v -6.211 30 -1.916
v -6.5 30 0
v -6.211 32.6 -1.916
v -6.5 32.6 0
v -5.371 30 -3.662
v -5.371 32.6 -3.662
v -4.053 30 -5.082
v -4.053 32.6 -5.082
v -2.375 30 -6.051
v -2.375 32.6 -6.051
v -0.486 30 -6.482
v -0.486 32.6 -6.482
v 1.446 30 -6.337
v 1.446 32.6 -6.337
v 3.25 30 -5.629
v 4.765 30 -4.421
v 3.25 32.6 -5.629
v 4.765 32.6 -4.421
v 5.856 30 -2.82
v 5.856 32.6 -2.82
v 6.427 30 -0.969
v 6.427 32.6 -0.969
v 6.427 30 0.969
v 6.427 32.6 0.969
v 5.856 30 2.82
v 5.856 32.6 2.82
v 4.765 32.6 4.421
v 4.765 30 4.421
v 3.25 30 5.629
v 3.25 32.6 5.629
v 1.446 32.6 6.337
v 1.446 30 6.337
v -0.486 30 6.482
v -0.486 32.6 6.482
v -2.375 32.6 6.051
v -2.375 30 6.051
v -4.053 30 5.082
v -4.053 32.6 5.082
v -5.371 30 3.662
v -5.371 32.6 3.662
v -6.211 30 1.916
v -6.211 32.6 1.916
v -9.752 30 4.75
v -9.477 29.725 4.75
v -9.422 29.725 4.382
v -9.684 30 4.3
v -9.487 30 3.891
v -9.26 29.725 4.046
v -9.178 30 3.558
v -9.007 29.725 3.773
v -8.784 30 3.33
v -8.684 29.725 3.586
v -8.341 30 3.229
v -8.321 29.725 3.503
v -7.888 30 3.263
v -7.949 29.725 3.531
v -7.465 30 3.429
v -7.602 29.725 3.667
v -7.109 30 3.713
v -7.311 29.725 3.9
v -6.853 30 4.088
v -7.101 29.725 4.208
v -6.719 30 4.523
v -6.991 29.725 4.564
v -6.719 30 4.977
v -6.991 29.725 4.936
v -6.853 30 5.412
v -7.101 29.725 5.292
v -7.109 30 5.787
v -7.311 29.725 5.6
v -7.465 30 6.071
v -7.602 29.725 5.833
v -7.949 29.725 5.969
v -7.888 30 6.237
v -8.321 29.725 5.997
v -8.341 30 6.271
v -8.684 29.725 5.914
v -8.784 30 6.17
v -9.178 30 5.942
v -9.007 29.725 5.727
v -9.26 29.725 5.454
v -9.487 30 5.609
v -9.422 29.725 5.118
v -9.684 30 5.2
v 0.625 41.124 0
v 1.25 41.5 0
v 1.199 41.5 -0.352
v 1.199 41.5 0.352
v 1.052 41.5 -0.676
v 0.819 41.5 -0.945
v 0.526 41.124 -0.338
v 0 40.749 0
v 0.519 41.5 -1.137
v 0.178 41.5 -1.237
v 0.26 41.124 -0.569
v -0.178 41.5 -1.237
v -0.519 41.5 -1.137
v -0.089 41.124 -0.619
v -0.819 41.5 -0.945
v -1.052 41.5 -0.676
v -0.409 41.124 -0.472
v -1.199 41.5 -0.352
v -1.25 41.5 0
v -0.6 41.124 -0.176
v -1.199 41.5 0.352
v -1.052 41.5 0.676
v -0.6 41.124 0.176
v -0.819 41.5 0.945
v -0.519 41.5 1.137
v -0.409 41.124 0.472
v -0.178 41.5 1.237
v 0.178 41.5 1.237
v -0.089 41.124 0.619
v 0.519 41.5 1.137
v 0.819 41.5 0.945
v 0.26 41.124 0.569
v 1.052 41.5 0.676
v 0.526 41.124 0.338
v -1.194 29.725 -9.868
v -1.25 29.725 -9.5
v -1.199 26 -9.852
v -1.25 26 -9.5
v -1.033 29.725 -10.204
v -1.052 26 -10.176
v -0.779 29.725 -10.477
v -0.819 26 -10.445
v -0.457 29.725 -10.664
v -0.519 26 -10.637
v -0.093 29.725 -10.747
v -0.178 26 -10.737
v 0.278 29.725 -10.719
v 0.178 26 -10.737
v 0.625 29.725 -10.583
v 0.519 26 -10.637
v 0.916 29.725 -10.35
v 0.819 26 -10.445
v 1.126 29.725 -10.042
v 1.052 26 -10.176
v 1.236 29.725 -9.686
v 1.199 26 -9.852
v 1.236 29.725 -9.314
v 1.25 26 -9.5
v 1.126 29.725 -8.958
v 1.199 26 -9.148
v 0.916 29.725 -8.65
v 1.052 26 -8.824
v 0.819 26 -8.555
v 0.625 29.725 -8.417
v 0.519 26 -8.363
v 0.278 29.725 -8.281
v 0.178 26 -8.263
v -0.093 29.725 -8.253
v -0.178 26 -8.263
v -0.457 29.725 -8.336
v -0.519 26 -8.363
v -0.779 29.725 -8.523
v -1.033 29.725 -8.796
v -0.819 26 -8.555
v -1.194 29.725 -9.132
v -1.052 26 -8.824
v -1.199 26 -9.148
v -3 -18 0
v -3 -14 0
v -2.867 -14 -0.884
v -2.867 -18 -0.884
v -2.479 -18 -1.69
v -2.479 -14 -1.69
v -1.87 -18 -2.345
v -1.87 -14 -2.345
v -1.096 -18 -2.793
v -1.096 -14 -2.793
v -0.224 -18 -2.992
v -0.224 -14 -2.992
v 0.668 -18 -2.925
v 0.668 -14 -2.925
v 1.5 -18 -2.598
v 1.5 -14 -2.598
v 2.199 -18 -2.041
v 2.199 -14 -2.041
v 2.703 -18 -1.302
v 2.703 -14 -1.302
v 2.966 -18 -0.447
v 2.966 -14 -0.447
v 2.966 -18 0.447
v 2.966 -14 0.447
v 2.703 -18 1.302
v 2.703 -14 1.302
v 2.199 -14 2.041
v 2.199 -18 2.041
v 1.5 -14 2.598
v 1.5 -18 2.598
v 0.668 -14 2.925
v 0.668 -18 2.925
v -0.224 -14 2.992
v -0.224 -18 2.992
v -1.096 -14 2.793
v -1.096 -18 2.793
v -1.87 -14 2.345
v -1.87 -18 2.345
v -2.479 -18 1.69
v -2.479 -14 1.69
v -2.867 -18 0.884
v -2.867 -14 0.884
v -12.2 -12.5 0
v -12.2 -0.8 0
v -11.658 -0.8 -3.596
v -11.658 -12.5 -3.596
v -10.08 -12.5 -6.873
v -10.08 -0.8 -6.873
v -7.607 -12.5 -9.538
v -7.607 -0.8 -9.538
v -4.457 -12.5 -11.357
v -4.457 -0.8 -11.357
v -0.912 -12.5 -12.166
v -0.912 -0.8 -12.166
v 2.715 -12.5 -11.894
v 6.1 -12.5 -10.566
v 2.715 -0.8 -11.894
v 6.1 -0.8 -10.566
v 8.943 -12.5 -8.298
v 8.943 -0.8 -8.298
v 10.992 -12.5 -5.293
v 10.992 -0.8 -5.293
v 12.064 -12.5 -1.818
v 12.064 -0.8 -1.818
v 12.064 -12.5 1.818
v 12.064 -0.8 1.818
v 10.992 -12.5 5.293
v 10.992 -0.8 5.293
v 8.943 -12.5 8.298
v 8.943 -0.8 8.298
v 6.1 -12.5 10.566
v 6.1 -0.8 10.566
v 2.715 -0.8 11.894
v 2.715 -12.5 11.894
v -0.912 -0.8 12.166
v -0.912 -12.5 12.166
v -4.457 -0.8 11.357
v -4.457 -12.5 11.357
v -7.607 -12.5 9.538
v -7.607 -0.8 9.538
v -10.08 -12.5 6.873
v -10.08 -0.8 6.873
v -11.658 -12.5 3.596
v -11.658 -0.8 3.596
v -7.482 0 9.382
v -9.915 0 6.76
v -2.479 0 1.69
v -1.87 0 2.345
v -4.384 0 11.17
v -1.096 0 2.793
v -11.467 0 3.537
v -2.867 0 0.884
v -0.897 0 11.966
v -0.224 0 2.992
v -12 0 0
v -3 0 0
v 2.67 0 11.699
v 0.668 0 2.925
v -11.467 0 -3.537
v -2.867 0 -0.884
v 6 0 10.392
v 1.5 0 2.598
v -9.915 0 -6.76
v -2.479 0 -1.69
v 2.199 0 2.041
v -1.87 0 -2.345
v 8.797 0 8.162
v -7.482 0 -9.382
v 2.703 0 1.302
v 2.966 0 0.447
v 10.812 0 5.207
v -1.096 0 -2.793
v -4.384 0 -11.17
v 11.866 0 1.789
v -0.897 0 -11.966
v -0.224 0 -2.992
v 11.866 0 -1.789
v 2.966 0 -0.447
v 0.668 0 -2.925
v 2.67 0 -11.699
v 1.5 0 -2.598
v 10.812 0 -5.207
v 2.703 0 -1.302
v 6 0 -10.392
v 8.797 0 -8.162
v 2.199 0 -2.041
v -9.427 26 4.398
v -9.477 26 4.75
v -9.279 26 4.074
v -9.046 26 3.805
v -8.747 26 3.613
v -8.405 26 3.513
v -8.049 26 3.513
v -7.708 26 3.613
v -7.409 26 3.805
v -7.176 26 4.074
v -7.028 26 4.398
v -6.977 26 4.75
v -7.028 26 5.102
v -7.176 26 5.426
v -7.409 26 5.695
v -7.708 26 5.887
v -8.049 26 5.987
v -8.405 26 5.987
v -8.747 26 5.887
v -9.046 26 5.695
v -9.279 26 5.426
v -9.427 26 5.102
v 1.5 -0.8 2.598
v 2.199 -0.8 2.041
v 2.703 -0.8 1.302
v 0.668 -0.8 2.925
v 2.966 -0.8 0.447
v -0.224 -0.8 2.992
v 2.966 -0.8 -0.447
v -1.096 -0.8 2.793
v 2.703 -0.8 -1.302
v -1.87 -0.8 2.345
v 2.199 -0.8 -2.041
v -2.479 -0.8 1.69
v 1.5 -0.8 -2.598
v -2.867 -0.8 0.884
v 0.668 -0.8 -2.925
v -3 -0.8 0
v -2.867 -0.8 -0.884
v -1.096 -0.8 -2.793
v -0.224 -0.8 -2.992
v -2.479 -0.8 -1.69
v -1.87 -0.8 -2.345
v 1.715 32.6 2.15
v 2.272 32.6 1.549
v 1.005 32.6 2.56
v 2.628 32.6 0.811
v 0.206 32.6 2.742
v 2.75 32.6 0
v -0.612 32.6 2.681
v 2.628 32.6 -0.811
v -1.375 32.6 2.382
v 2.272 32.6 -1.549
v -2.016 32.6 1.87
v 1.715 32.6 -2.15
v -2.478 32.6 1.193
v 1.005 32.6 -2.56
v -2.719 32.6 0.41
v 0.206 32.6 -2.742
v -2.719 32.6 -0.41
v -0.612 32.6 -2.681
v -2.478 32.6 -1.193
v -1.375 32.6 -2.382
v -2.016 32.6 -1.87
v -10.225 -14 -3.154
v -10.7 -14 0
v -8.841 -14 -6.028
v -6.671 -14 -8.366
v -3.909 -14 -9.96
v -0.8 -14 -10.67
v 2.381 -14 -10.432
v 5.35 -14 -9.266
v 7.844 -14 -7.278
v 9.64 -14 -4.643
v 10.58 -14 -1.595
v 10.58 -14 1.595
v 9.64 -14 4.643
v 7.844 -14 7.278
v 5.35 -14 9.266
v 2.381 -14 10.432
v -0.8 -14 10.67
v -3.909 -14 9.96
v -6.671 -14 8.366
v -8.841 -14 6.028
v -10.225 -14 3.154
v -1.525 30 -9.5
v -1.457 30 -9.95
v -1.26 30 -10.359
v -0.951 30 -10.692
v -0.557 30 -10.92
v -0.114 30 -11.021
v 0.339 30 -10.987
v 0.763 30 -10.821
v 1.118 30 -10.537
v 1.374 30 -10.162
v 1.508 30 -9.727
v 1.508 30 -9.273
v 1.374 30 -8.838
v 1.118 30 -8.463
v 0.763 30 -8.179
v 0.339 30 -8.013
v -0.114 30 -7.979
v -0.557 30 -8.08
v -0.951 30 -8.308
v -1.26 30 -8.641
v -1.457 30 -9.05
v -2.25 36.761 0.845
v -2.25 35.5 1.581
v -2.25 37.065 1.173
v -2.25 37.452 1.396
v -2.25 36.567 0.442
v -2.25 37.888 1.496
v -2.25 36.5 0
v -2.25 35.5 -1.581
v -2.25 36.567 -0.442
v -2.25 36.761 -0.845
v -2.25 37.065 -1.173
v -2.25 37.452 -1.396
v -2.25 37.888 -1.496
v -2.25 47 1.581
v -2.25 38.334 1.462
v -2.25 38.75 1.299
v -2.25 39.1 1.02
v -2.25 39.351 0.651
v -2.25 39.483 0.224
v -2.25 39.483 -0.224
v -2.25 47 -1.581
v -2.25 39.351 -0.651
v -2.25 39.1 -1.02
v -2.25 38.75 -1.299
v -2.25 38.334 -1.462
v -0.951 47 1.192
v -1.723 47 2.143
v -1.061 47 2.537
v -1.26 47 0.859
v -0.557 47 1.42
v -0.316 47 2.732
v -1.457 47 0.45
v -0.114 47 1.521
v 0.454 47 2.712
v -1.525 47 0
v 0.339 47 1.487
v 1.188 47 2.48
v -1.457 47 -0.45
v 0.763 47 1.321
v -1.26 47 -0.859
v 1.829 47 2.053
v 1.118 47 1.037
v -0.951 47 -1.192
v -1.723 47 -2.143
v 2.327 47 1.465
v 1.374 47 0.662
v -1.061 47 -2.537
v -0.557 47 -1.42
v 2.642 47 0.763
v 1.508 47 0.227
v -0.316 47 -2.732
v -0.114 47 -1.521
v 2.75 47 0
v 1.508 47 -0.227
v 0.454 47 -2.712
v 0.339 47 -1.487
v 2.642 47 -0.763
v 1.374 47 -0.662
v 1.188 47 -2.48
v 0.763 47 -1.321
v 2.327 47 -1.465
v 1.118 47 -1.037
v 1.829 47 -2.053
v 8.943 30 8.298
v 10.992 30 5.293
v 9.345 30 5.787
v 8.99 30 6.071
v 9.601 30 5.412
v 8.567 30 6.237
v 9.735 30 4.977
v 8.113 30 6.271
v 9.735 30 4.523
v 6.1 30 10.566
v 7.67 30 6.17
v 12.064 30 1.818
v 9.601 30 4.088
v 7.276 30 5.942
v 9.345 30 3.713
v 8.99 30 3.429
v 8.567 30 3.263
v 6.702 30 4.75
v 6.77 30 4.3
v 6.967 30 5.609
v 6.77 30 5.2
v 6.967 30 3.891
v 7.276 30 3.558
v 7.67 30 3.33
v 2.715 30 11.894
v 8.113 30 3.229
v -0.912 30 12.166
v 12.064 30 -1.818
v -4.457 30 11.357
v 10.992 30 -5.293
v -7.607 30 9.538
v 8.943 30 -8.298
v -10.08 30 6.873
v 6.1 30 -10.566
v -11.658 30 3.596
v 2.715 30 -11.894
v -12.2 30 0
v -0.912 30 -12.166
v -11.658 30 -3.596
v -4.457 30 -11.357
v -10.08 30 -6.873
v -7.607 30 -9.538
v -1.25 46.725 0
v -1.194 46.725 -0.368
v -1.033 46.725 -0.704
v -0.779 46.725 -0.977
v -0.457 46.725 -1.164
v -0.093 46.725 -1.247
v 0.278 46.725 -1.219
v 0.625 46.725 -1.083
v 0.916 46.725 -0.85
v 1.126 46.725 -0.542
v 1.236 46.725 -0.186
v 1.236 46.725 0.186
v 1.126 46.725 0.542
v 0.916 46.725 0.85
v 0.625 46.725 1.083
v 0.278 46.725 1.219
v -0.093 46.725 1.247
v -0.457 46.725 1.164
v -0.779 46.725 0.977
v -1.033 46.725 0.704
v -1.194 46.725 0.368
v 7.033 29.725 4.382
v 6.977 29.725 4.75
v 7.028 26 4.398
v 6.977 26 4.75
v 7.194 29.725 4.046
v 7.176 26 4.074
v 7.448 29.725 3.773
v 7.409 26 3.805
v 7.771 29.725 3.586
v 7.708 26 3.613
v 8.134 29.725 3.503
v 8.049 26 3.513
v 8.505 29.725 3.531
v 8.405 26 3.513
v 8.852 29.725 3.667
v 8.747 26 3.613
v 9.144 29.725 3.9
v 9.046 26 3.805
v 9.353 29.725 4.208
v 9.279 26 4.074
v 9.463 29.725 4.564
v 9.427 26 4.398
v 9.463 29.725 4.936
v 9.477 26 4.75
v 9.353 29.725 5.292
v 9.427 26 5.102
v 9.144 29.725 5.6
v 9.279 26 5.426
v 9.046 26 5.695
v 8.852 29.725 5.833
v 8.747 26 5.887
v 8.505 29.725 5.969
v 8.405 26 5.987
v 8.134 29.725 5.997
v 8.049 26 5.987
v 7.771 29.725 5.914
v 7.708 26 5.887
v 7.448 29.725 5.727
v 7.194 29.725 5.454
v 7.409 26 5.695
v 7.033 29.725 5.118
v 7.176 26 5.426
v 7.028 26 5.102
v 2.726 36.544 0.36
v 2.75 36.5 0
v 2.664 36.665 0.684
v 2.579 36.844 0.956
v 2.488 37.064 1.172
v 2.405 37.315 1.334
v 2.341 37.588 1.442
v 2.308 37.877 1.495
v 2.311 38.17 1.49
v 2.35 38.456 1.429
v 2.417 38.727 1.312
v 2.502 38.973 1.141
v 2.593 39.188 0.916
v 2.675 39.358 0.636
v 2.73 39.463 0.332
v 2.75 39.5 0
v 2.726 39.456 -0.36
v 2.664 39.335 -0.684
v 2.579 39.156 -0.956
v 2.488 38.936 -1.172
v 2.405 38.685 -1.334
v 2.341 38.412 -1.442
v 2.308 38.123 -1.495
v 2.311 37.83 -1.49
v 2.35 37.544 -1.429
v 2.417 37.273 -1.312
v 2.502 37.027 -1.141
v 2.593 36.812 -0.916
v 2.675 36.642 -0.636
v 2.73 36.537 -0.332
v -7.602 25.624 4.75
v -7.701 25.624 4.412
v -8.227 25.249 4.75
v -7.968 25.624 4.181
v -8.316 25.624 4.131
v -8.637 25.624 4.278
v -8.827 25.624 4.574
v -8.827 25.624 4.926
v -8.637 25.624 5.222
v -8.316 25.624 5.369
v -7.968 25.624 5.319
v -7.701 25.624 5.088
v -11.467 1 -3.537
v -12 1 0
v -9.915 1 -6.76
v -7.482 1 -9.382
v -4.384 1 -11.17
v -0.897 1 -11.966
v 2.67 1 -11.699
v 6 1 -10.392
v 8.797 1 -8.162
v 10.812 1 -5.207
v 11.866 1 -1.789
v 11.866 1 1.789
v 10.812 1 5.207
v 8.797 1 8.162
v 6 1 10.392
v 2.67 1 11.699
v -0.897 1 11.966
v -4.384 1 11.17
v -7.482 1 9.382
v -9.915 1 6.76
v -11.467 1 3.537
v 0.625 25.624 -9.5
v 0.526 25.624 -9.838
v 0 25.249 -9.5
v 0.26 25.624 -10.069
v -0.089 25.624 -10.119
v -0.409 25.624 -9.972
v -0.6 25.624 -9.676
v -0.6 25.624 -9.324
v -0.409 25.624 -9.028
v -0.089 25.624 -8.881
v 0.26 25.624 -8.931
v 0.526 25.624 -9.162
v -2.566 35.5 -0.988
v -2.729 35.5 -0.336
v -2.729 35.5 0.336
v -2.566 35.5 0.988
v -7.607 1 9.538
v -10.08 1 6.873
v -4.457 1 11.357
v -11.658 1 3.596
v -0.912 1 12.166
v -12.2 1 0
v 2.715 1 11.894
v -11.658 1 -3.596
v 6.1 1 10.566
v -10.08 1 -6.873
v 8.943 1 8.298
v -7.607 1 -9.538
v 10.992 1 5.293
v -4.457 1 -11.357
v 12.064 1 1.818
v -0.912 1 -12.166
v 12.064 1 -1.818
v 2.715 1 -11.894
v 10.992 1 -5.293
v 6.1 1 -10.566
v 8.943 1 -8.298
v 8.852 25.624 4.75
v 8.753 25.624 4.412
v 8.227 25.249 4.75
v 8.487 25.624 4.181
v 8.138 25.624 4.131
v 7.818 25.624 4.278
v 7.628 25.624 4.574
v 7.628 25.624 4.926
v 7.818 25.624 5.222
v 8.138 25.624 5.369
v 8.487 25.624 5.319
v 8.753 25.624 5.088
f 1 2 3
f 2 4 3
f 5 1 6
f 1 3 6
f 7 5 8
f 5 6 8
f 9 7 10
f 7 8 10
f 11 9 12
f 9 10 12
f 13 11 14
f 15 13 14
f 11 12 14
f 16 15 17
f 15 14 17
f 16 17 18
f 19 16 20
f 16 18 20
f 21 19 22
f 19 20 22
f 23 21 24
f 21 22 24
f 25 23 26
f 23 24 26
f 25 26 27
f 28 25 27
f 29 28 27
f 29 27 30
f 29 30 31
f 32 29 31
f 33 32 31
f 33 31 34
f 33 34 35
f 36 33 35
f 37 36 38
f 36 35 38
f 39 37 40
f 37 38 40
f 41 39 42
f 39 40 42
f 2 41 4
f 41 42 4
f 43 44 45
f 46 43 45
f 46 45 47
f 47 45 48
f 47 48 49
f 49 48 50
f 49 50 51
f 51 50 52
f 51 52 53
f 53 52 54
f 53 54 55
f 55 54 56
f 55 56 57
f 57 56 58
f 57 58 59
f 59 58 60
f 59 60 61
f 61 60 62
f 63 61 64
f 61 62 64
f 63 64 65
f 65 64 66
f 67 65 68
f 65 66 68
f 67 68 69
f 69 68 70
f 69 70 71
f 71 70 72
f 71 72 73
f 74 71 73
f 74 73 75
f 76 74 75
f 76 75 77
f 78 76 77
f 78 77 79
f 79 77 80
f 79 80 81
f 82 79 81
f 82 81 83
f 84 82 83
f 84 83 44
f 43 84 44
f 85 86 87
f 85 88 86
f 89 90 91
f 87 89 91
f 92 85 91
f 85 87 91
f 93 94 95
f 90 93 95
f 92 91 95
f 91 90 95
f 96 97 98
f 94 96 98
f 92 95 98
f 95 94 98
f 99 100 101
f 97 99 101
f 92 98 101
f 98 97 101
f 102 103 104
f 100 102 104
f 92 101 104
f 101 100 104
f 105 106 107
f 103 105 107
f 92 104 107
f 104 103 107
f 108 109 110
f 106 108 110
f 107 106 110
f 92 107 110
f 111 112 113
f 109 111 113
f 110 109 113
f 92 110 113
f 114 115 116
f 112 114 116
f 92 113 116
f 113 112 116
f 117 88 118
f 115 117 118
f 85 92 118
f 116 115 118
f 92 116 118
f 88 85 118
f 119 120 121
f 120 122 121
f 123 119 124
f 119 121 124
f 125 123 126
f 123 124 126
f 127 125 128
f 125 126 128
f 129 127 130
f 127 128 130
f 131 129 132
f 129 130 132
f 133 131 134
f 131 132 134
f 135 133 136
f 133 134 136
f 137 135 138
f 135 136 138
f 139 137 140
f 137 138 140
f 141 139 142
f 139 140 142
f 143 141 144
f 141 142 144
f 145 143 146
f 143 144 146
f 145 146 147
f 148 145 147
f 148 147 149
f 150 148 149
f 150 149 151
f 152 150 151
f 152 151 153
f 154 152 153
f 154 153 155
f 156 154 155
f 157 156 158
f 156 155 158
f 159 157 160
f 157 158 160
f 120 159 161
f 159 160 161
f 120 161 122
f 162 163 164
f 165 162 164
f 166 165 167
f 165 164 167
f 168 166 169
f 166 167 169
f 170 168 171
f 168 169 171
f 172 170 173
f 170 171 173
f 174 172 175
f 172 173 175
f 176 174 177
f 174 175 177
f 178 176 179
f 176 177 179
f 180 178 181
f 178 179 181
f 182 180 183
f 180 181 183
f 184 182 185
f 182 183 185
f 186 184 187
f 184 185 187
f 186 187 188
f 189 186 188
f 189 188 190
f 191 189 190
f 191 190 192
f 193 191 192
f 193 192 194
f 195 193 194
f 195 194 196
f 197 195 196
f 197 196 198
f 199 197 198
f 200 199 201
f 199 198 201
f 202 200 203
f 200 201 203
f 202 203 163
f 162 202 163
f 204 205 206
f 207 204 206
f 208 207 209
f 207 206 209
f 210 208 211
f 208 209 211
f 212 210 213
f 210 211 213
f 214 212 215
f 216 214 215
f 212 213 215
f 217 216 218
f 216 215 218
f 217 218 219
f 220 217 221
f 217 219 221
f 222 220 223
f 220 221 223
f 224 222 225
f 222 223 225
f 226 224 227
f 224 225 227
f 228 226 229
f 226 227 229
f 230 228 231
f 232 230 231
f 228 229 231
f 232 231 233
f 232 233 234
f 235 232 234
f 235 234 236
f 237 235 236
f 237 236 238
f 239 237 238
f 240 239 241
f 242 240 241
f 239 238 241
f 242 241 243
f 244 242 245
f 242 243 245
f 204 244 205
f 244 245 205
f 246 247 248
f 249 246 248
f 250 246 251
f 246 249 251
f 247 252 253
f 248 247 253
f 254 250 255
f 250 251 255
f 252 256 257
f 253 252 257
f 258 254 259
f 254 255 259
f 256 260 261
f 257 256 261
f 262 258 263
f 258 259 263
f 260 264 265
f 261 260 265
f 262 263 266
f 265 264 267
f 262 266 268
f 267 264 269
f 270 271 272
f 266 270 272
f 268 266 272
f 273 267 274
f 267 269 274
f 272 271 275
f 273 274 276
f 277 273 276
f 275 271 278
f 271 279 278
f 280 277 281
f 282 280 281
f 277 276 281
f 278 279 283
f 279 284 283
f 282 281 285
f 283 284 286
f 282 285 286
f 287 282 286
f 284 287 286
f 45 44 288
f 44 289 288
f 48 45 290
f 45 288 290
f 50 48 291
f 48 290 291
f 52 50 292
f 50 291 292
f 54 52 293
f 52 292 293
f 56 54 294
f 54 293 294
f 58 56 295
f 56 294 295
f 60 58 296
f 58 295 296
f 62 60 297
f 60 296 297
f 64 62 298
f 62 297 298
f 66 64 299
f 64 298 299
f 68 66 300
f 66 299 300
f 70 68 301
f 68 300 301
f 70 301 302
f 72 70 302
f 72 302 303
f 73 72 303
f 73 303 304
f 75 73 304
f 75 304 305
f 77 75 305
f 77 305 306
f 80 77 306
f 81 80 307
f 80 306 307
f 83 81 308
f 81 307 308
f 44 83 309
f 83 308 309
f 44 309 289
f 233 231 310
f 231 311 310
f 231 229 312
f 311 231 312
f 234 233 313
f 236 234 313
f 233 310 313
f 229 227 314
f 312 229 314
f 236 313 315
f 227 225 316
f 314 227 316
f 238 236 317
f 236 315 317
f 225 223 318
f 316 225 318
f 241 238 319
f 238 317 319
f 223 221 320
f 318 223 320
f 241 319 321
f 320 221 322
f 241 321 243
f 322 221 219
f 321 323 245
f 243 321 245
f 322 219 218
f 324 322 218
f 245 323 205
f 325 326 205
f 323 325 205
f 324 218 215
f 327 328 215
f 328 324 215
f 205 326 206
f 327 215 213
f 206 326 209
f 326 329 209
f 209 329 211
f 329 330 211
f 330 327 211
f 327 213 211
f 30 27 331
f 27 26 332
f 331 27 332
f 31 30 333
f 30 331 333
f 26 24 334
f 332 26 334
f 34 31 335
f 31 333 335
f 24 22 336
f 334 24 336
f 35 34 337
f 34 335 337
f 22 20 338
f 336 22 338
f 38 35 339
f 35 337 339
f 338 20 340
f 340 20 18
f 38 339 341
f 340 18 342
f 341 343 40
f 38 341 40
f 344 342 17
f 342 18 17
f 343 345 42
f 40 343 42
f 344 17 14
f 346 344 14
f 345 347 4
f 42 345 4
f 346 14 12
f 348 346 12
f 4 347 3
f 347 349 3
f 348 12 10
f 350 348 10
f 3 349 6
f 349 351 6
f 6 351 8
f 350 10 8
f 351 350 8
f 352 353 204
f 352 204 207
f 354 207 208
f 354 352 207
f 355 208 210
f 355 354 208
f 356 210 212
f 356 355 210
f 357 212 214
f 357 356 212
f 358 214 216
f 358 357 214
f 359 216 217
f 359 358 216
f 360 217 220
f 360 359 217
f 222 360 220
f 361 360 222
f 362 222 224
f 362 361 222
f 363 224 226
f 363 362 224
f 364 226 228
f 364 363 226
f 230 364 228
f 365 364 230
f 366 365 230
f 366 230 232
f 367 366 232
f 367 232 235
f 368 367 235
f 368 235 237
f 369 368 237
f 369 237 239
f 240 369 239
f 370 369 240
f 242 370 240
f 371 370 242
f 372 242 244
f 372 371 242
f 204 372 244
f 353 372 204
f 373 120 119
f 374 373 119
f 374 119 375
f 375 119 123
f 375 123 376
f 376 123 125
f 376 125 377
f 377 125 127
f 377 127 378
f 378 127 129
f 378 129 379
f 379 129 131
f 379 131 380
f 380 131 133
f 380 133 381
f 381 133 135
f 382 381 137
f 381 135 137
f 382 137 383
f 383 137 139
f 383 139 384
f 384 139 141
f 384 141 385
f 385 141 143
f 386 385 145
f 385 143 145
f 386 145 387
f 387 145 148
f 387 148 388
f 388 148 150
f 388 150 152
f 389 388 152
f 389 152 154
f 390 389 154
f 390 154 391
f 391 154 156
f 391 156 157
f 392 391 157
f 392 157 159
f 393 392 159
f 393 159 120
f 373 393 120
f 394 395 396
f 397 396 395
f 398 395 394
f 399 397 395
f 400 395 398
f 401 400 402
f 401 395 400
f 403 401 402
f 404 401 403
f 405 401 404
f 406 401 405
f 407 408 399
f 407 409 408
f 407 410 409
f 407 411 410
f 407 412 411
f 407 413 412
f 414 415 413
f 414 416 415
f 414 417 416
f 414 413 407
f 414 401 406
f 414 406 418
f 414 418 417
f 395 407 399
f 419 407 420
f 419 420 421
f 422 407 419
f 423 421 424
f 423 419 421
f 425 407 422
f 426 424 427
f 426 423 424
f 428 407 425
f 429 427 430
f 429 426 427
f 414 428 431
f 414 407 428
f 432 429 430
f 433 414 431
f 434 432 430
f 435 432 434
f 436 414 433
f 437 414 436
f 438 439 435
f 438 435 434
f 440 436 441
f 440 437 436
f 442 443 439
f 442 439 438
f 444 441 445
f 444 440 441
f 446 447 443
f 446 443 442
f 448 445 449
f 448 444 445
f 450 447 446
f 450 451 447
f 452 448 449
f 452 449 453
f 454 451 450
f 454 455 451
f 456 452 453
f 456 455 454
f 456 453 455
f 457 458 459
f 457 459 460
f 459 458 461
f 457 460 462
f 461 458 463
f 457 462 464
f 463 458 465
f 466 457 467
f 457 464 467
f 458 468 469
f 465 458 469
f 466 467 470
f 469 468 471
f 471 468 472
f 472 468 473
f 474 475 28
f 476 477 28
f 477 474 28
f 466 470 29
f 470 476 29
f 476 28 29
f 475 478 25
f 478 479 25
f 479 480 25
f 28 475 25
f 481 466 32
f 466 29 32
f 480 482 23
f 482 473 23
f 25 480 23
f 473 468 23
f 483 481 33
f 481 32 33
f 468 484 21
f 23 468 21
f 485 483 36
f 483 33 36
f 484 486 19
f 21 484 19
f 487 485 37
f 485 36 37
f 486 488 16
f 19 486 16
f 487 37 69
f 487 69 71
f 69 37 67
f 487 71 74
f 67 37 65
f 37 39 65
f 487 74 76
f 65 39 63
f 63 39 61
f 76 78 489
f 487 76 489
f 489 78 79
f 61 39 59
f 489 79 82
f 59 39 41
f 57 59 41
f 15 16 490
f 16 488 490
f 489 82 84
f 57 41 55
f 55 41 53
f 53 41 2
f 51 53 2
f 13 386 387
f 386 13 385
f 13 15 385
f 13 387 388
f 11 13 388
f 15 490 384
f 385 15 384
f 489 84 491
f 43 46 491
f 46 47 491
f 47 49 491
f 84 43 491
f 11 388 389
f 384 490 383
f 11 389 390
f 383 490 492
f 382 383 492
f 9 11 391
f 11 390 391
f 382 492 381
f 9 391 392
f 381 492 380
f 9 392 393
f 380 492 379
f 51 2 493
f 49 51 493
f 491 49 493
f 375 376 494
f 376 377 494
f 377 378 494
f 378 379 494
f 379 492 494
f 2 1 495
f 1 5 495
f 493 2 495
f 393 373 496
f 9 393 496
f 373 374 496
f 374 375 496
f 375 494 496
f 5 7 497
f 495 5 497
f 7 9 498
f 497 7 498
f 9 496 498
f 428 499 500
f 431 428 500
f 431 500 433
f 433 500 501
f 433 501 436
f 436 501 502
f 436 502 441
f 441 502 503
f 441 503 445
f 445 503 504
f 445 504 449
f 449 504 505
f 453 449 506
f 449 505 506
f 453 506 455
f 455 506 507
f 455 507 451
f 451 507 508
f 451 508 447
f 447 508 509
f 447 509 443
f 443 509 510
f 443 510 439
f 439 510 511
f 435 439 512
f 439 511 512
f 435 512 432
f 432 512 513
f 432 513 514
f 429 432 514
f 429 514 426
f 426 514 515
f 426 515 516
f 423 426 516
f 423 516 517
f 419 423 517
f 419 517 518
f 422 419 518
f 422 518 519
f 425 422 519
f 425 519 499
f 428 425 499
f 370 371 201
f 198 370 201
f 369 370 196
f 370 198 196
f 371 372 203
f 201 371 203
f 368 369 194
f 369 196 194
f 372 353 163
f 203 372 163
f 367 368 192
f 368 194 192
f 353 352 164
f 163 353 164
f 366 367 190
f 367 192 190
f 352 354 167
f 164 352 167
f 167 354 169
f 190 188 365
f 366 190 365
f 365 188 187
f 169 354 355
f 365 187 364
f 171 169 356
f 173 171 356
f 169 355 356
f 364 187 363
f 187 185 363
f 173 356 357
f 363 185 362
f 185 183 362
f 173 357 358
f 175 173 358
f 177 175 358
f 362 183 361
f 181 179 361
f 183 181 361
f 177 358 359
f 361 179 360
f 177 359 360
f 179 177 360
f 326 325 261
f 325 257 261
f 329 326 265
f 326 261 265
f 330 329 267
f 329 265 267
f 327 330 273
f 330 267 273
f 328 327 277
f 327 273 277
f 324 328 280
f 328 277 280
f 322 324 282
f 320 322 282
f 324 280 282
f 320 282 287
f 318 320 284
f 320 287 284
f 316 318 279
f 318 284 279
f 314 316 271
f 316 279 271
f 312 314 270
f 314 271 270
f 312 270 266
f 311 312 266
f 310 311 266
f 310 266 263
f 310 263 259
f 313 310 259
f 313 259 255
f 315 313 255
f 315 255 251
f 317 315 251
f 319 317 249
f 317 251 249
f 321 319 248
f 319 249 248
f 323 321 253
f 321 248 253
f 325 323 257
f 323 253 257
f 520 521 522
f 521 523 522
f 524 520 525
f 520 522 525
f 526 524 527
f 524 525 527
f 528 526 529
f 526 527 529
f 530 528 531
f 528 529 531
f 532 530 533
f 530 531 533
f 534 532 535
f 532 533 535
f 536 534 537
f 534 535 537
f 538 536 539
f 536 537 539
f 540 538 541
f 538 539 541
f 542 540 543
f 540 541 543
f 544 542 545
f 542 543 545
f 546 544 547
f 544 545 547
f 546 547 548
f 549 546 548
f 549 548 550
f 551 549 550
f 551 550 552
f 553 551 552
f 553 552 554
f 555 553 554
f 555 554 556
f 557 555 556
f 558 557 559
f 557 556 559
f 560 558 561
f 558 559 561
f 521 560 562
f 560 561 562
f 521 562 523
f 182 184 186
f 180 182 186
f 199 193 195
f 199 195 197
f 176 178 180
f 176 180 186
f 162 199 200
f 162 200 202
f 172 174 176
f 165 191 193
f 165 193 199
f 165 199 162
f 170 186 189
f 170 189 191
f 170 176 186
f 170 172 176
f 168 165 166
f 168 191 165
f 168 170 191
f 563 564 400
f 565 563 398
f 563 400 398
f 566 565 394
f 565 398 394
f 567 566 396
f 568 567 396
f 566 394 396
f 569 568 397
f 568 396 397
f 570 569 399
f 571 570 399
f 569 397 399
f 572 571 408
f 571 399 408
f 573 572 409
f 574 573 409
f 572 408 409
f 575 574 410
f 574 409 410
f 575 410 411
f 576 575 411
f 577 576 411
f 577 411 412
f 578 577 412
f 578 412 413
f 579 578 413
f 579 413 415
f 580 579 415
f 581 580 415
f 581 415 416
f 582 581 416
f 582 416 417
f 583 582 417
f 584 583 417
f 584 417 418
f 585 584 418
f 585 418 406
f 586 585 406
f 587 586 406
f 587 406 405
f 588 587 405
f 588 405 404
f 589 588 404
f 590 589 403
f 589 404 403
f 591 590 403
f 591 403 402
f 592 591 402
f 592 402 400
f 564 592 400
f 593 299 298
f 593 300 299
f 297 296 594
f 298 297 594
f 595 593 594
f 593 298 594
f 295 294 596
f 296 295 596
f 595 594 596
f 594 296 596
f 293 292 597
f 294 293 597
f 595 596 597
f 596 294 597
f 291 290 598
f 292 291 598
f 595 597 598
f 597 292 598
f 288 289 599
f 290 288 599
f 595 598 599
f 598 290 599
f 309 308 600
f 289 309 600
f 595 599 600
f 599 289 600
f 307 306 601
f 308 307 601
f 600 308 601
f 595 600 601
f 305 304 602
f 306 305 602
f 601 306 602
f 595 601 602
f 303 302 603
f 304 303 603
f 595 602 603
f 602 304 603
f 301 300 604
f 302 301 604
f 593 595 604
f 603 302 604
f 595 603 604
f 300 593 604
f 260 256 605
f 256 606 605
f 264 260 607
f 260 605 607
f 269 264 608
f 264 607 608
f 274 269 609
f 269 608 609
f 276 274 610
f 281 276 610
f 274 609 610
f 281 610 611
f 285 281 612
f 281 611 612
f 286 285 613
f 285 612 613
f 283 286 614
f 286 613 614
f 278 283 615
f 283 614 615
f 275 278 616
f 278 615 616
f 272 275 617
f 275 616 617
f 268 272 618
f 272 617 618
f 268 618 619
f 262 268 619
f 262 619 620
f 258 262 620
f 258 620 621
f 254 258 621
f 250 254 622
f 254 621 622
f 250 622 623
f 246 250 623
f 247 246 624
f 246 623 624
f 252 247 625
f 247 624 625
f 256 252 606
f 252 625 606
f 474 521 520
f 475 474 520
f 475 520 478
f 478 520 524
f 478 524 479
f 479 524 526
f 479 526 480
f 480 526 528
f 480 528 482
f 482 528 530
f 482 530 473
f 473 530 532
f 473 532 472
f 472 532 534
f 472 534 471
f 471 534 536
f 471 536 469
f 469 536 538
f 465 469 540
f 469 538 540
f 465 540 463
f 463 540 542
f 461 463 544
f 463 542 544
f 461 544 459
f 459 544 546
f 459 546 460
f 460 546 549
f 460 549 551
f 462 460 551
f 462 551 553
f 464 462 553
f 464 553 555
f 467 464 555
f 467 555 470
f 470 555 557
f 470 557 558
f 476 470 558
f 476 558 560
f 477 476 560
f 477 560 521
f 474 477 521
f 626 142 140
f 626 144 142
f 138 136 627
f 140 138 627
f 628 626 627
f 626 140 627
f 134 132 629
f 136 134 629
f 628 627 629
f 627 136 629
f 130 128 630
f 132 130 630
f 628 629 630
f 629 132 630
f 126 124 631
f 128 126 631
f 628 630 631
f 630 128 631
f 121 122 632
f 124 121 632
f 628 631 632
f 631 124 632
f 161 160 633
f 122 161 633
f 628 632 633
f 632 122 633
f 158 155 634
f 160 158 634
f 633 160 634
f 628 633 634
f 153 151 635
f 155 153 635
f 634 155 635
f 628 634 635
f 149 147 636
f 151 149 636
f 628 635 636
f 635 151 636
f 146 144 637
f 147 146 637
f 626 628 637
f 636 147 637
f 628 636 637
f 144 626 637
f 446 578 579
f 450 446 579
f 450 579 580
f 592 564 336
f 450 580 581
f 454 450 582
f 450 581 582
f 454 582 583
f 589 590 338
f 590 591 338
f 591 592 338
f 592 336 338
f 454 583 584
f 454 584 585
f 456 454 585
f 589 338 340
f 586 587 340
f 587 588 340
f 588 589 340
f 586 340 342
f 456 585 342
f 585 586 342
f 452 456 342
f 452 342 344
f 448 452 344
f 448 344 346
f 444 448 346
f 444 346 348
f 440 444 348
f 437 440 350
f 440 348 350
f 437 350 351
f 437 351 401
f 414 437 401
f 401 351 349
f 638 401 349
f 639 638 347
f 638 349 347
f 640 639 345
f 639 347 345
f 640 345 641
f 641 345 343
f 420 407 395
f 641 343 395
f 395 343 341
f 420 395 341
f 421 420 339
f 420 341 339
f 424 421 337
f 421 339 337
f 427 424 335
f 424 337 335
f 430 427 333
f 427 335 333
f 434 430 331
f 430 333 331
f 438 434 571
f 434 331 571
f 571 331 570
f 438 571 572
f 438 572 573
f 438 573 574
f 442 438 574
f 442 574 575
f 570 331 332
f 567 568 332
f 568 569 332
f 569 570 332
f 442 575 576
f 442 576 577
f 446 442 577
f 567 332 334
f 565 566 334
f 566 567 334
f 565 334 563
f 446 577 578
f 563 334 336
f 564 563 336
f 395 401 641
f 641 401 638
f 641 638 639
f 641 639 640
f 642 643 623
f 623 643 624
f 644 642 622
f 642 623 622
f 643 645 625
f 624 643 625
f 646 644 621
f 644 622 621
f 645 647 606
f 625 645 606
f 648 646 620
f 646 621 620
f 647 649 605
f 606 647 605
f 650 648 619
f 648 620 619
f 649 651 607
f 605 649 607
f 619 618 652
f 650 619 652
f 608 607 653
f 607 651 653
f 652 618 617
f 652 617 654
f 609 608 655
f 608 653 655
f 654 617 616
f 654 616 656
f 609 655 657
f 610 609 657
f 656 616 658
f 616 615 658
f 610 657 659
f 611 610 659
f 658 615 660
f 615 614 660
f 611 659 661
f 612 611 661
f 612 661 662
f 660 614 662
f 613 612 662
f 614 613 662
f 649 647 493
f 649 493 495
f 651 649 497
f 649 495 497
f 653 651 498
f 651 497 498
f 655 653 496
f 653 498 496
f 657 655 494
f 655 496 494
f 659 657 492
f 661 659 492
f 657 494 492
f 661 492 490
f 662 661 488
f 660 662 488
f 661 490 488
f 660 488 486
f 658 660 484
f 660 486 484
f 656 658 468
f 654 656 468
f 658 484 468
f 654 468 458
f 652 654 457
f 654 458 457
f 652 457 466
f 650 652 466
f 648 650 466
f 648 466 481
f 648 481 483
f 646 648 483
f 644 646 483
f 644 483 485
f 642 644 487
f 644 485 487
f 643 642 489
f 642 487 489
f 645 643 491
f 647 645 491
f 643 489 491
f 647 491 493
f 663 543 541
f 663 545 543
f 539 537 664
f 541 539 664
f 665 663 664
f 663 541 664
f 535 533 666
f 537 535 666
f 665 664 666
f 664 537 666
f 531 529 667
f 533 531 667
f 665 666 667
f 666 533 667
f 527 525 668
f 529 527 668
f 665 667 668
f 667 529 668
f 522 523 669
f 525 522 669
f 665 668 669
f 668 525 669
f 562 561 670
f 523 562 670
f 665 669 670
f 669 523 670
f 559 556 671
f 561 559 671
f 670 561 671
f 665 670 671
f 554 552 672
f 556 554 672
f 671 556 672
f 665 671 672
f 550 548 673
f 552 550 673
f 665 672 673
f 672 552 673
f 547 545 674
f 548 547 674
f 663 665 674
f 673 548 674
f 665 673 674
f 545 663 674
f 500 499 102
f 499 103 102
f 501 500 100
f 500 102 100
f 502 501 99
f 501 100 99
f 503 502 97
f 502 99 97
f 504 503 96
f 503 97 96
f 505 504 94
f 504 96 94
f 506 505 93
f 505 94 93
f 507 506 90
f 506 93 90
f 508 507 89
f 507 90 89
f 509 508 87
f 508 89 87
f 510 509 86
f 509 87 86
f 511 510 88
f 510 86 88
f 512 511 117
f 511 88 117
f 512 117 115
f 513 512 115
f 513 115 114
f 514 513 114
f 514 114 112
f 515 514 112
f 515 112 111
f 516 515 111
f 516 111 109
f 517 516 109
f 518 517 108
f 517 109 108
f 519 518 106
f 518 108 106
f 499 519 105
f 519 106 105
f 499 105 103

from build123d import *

# Parameters (mm, degrees)
SKETCH_2_R                   = 2.75
EXTRUDE_1_DEPTH              = 14.4
CUT_EXTRUDE_1_DEPTH          = 51.066755437
CUT_EXTRUDE_1_DEPTH_BACK     = 51.066755437
SKETCH_3_W                   = 1.5
SKETCH_3_H                   = 12
CUT_EXTRUDE_2_REACH          = 52.662
CUT_EXTRUDE_2_END_RADIUS     = 2.75
SKETCH_4_R                   = 1.5
HOLE_WIZARD_M3_1_D           = 2.5
HOLE_WIZARD_M3_1_DEPTH       = 5.5
HOLE_WIZARD_M3_1_CSINK_D     = 3.05
HOLE_WIZARD_M3_1_CSINK_ANGLE = 90
HOLE_WIZARD_M3_1_TIP         = 0.751075774
HOLE_WIZARD_M3_2_D           = 2.5
HOLE_WIZARD_M3_2_DEPTH       = 4
HOLE_WIZARD_M3_2_CSINK_D     = 3.05
HOLE_WIZARD_M3_2_CSINK_ANGLE = 90
HOLE_WIZARD_M3_2_TIP         = 0.751075774
CHAMFER_1_SIZE               = 1.5
SKETCH_9_R                   = 3
EXTRUDE_2_DEPTH              = 4


with BuildPart() as part:
    # 草图1 → 旋转1 (revolve)
    with BuildSketch(Plane.XY, mode=Mode.PRIVATE) as revolve_1_sk:
        Polygon((3, 0), (12, 0), (12, 1), (12.2, 1), (12.2, 30), (6.5, 30), (6.5, 32.6), (0, 32.6), (0, -14), (12.2, -14), (12.2, -0.8), (3, -0.8), align=None)
    revolve(revolve_1_sk.sketch.rotate(Axis((0, 32.6, 0), (0, -1, 0)), 180), axis=Axis((0, 32.6, 0), (0, -1, 0)))

    # 草图2 → 凸台-拉伸1 (add)
    with BuildSketch(Plane(origin=(0, 32.6, 0), x_dir=(1, 0, 0), z_dir=(0, 1, 0))):
        Circle(SKETCH_2_R)
    extrude(amount=EXTRUDE_1_DEPTH)

    # 草图3 → 切除-拉伸1 (cut, two sides: drawn at the far end of the back side and taken through both)
    with BuildSketch(Plane.XY.offset(-CUT_EXTRUDE_1_DEPTH_BACK)):
        with Locations((-3, 41.5)):
            Rectangle(SKETCH_3_W, SKETCH_3_H)
    extrude(amount=CUT_EXTRUDE_1_DEPTH + CUT_EXTRUDE_1_DEPTH_BACK, mode=Mode.SUBTRACT)

    # 切除-拉伸2: up to this cylinder (the profile starts inside it)
    cut_extrude_2_end = Plane(origin=(0, 38, 0), z_dir=(0, -1, 0)) * Cylinder(CUT_EXTRUDE_2_END_RADIUS, 111.824, mode=Mode.PRIVATE)
    # 草图4 → 切除-拉伸2 (cut, up to the surface)
    with BuildSketch(Plane.ZY.offset(2.25), mode=Mode.PRIVATE) as cut_extrude_2_sk1:
        with Locations(Location((0, 38, 0), (0, 0, 270))):
            Circle(SKETCH_4_R)
    cut_extrude_2_tool1 = extrude(cut_extrude_2_sk1.sketch, amount=-CUT_EXTRUDE_2_REACH, mode=Mode.PRIVATE) & cut_extrude_2_end
    add(cut_extrude_2_tool1.solids().sort_by_distance((-2.25, 38, 0))[0], mode=Mode.SUBTRACT)

    # M3 螺纹孔1
    with Locations(Plane(origin=(0, 47, 0), x_dir=(1, 0, 0), z_dir=(0, 1, 0))):
        with Locations((0, 0)):
            CounterSinkHole(HOLE_WIZARD_M3_1_D / 2, HOLE_WIZARD_M3_1_CSINK_D / 2, depth=HOLE_WIZARD_M3_1_DEPTH, counter_sink_angle=HOLE_WIZARD_M3_1_CSINK_ANGLE)
            with Locations((0, 0, -(HOLE_WIZARD_M3_1_DEPTH + HOLE_WIZARD_M3_1_TIP / 2))):  # 118° drill point
                Cone(0, HOLE_WIZARD_M3_1_D / 2, HOLE_WIZARD_M3_1_TIP, mode=Mode.SUBTRACT)

    # M3 螺纹孔2
    with Locations(Plane(origin=(8.227241336, 30, 4.75), x_dir=(1, 0, 0), z_dir=(0, 1, 0))):
        with Locations((0, 0), (-16.454482672, 0), (-8.227241336, 14.25)):
            CounterSinkHole(HOLE_WIZARD_M3_2_D / 2, HOLE_WIZARD_M3_2_CSINK_D / 2, depth=HOLE_WIZARD_M3_2_DEPTH, counter_sink_angle=HOLE_WIZARD_M3_2_CSINK_ANGLE)
            with Locations((0, 0, -(HOLE_WIZARD_M3_2_DEPTH + HOLE_WIZARD_M3_2_TIP / 2))):  # 118° drill point
                Cone(0, HOLE_WIZARD_M3_2_D / 2, HOLE_WIZARD_M3_2_TIP, mode=Mode.SUBTRACT)

    # 倒角1
    chamfer_1_edges = [part.edges().sort_by_distance(p)[0] for p in [
        (12.2, -14, 0),
    ]]
    chamfer(chamfer_1_edges, length=CHAMFER_1_SIZE)

    # 草图9 → 凸台-拉伸2 (add)
    with BuildSketch(Plane.XZ.offset(14)):
        with Locations(Location((0, 0, 0), (0, 0, 180))):
            Circle(SKETCH_9_R)
    extrude(amount=EXTRUDE_2_DEPTH)


solid = part.part
